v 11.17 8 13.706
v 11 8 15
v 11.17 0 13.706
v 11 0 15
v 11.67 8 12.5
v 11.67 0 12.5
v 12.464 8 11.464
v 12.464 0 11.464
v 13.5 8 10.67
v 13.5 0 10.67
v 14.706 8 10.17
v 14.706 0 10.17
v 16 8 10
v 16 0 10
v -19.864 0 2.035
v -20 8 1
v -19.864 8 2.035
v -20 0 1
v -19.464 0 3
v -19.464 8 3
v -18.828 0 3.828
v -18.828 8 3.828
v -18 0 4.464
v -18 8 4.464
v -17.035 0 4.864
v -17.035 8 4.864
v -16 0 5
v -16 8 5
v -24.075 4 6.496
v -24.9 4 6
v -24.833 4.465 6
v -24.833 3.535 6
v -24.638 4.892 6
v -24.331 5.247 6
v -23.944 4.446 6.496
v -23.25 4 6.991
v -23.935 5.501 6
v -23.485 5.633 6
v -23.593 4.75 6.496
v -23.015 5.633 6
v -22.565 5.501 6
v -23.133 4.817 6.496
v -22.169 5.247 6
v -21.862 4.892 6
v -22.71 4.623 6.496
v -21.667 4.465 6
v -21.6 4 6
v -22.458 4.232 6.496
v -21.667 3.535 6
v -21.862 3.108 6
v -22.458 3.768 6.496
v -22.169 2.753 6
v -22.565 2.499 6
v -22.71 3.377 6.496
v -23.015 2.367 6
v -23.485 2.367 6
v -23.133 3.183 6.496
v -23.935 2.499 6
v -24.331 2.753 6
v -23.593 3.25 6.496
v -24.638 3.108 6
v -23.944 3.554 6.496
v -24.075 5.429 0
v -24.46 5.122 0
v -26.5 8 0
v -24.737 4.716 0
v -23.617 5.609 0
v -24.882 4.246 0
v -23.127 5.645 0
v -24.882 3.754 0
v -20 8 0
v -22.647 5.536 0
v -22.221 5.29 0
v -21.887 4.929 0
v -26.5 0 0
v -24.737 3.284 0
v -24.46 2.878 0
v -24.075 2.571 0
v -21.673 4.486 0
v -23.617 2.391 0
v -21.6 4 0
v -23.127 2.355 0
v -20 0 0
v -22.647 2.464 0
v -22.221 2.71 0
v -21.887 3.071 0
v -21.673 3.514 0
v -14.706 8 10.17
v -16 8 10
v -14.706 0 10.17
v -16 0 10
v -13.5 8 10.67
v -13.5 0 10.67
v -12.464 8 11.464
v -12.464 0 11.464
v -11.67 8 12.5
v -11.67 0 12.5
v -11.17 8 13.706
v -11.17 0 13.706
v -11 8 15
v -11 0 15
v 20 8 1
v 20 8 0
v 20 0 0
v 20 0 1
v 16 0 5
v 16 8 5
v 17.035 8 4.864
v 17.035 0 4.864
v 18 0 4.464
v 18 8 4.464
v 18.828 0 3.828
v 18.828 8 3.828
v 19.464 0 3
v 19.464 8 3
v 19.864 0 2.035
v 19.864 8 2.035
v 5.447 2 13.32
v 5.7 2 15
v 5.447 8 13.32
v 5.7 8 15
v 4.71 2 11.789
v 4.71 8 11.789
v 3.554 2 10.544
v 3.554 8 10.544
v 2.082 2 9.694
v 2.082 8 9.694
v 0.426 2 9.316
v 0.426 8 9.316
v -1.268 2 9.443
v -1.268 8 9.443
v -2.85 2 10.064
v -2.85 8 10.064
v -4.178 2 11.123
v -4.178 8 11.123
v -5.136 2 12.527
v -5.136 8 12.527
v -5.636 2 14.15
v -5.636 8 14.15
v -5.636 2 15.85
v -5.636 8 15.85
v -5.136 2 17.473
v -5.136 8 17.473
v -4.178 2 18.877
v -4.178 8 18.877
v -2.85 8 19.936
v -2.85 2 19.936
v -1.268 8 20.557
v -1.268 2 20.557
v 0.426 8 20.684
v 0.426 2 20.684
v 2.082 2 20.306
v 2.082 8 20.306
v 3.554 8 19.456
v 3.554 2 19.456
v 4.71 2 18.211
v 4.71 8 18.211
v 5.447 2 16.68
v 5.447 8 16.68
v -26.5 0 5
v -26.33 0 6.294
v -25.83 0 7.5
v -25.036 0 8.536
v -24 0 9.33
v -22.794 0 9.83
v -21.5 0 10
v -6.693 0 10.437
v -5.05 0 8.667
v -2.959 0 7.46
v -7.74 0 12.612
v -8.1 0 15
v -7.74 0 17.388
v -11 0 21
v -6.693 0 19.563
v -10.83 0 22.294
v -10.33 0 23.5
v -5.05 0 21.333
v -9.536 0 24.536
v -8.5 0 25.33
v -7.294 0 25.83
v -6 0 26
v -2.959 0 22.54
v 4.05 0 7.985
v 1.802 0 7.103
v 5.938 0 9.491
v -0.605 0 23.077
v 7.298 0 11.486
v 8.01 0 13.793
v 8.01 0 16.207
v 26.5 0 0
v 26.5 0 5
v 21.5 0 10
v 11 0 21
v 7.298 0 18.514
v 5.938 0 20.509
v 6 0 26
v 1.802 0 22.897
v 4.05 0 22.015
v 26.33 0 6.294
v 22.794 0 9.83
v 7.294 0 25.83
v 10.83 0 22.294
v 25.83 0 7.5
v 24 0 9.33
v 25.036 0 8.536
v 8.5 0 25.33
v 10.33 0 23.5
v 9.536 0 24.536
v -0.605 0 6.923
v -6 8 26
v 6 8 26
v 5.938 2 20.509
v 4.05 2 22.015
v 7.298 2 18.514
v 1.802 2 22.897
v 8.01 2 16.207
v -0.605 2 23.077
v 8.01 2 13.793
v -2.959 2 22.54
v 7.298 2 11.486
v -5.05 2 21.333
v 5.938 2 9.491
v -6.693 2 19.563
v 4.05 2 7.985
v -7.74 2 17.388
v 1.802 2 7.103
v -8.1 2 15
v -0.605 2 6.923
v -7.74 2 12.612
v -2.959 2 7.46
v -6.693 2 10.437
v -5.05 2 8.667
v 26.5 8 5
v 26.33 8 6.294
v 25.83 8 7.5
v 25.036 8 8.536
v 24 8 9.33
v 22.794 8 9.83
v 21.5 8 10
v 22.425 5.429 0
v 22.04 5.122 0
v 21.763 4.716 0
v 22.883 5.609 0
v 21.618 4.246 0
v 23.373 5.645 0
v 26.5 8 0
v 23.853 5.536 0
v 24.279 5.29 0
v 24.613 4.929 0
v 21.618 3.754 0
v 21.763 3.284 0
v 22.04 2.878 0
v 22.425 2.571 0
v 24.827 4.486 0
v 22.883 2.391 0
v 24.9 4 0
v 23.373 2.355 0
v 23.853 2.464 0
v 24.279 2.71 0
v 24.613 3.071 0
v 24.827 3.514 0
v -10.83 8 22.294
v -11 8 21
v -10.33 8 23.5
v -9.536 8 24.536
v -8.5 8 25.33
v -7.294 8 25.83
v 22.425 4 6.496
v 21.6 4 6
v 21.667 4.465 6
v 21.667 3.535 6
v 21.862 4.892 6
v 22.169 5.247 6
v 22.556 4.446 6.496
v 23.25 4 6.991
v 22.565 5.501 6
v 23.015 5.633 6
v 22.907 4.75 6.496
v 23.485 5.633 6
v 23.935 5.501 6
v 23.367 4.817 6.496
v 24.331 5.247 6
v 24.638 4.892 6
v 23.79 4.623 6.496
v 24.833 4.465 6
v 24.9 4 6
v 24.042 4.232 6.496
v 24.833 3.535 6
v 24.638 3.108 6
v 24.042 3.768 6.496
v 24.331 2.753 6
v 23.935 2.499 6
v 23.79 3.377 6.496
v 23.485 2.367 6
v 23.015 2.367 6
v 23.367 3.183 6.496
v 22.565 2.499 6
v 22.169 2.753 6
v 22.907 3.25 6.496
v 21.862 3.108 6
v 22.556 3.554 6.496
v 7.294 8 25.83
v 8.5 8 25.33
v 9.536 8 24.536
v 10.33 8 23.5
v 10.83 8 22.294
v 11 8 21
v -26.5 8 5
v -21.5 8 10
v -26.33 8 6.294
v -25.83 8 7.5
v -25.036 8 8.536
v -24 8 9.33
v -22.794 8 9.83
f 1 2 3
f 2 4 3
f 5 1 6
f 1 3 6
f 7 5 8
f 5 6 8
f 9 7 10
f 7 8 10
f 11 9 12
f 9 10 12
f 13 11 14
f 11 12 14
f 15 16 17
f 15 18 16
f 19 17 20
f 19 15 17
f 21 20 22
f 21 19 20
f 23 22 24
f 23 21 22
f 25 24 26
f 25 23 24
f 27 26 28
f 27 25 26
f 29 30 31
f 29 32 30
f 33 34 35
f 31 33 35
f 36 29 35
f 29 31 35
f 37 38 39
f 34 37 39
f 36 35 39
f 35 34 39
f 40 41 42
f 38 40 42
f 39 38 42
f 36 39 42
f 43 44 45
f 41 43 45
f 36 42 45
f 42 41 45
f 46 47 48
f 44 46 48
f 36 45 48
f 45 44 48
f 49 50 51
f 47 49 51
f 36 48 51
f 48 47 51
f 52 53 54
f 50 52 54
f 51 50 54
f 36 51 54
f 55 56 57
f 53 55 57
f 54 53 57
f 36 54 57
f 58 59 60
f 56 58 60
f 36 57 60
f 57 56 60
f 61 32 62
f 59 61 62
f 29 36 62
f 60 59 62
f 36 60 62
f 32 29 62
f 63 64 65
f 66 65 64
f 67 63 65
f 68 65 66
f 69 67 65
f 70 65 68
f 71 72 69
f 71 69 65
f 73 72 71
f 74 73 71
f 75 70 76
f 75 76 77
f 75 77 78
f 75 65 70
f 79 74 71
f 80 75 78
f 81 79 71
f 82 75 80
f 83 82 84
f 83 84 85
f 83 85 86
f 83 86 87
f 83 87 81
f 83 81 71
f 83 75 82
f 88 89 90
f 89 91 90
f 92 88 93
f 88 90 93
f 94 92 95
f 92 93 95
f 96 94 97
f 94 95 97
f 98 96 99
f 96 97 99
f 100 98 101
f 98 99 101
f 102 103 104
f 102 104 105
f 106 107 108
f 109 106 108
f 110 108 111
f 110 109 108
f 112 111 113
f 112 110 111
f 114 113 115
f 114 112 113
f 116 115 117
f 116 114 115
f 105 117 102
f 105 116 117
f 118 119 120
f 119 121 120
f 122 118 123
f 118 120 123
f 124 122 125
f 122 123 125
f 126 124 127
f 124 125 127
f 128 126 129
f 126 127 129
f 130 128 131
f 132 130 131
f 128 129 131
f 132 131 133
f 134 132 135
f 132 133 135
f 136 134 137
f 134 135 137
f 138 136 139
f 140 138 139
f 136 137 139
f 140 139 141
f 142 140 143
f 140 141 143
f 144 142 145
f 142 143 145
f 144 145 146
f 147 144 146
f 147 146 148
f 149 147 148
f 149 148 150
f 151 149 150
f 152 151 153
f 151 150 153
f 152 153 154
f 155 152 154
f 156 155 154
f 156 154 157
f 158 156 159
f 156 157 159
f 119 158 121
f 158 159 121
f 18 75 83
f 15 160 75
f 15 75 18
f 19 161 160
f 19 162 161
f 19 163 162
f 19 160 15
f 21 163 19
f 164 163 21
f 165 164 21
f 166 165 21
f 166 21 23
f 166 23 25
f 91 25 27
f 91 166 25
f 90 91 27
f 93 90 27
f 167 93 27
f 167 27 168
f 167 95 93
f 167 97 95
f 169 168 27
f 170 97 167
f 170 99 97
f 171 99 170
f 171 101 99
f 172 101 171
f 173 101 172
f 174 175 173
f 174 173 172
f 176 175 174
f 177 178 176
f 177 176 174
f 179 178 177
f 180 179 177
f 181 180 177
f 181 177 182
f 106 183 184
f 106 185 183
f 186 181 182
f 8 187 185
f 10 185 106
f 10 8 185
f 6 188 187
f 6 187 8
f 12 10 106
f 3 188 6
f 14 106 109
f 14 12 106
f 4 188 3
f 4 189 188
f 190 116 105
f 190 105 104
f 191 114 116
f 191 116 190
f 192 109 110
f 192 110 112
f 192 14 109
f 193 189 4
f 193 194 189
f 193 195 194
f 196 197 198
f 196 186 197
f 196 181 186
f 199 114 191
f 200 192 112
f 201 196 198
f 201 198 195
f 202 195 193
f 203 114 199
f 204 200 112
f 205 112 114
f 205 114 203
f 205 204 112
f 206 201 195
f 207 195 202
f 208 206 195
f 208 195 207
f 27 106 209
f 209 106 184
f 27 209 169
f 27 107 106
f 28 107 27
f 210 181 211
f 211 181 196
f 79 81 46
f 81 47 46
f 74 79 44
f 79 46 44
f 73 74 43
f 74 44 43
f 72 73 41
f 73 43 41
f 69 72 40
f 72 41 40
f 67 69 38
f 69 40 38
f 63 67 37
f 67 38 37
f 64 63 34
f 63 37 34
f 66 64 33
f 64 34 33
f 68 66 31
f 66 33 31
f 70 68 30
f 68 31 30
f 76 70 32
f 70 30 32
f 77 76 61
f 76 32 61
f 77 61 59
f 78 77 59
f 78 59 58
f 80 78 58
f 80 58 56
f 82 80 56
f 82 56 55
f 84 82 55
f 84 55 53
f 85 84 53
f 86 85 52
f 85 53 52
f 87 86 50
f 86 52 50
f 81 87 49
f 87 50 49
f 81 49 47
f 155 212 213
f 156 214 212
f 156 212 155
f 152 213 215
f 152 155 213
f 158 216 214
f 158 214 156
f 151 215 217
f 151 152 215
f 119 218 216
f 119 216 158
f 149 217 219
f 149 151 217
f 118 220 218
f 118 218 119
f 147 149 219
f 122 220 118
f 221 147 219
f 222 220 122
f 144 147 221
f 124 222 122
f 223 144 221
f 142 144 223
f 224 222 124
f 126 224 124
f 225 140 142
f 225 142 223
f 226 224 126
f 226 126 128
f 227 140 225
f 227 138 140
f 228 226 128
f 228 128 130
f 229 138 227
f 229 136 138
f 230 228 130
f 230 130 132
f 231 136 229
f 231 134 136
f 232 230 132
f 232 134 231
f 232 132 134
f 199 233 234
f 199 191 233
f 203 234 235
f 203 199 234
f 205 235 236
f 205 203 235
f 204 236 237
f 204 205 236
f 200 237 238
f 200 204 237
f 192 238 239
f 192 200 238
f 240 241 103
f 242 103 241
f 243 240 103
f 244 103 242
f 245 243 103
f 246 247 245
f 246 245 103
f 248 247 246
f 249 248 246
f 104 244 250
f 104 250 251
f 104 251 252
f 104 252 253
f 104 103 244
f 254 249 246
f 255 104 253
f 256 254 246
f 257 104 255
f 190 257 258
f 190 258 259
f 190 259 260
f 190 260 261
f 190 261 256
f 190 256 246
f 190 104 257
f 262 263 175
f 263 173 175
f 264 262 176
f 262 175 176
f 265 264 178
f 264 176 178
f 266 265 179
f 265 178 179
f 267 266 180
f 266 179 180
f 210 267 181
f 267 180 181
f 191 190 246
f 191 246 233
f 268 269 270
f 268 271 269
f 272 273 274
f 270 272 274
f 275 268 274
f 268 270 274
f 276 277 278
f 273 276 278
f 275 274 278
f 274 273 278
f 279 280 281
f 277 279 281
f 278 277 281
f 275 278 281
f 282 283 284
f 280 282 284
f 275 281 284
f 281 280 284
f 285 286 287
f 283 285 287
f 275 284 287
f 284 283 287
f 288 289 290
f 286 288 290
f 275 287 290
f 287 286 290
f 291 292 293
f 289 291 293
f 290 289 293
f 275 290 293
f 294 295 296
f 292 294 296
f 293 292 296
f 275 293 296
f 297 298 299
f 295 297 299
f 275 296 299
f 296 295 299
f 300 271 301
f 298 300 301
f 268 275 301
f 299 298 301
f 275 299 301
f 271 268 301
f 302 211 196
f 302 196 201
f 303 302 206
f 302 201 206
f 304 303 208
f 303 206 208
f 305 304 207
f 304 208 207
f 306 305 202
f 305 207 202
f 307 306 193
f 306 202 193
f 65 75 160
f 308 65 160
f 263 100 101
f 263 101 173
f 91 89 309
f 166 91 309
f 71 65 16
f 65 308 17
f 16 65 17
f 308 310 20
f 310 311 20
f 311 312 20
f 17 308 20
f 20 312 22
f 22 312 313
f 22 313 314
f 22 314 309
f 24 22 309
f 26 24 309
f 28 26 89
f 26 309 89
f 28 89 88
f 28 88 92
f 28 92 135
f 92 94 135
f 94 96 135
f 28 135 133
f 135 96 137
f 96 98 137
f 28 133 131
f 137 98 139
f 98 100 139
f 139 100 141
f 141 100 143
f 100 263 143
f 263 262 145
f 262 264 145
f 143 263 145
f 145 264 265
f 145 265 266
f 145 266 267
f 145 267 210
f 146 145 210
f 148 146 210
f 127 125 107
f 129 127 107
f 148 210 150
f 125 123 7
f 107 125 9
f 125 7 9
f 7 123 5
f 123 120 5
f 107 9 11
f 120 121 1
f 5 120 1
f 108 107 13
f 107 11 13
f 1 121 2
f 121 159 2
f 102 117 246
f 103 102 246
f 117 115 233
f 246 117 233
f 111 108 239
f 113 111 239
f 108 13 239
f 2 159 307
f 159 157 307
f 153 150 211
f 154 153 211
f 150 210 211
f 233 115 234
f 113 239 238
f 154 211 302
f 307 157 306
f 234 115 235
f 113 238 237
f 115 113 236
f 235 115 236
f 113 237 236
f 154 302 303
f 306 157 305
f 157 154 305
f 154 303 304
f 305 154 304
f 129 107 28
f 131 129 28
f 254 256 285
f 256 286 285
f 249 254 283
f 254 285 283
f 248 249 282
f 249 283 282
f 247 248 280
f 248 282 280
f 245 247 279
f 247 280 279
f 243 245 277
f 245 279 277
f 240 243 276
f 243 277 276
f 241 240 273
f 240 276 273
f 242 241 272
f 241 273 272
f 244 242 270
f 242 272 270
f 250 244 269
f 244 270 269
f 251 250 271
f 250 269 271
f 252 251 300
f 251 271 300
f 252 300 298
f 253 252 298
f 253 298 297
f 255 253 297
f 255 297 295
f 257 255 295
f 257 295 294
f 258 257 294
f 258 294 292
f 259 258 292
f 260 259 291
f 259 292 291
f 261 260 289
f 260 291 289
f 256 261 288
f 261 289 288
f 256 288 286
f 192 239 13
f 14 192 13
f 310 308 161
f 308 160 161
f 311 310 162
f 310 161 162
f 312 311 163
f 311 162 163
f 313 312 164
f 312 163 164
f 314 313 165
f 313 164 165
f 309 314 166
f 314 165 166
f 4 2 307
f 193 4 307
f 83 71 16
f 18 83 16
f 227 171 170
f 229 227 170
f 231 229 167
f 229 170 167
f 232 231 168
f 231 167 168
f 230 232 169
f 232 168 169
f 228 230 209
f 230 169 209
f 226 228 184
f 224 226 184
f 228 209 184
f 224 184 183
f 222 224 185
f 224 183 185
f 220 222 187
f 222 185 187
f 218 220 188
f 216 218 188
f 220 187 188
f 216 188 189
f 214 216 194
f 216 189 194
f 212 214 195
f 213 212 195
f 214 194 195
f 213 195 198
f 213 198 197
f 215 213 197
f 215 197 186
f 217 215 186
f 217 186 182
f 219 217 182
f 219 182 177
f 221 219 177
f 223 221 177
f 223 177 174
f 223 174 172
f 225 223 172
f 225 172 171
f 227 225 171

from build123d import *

# Parameters (mm, degrees)
SKETCH1_W                                = 53
SKETCH1_H                                = 26
BOSS_EXTRUDE1_DEPTH                      = 8
SKETCH2_W                                = 15.5
SKETCH2_H                                = 16
CUT_EXTRUDE1_DEPTH                       = 38.976966704
SKETCH3_W                                = 15.5
SKETCH3_H                                = 16
CUT_EXTRUDE2_DEPTH                       = 38.976966704
SKETCH4_W                                = 40.000000023
SKETCH4_H                                = 5
CUT_EXTRUDE3_DEPTH                       = 38.976966704
CBORE_FOR_M10_HEX_HEAD_BOLT1_D           = 11.4
CBORE_FOR_M10_HEX_HEAD_BOLT1_CBORE_D     = 16.2
CBORE_FOR_M10_HEX_HEAD_BOLT1_CBORE_DEPTH = 2
M4X0_7_TAPPED_HOLE1_D                    = 3.3
M4X0_7_TAPPED_HOLE1_DEPTH                = 6
M4X0_7_TAPPED_HOLE1_TIP                  = 0.991420021
FILLET1_R                                = 4
FILLET2_R                                = 5


with BuildPart() as part:
    # Sketch1 → Boss-Extrude1 (new body)
    with BuildSketch(Plane.XZ):
        with Locations((0, 13)):
            Rectangle(SKETCH1_W, SKETCH1_H)
    extrude(amount=-BOSS_EXTRUDE1_DEPTH)

    # Sketch2 → Cut-Extrude1 (cut, through all)
    with BuildSketch(Plane(origin=(0, 8, 0), x_dir=(-1, 0, 0), z_dir=(0, 1, 0))):
        with Locations((-18.75, 18)):
            Rectangle(SKETCH2_W, SKETCH2_H)
    extrude(amount=-CUT_EXTRUDE1_DEPTH, mode=Mode.SUBTRACT)

    # Sketch3 → Cut-Extrude2 (cut, through all)
    with BuildSketch(Plane(origin=(0, 8, 0), x_dir=(-1, 0, 0), z_dir=(0, 1, 0))):
        with Locations((18.75, 18)):
            Rectangle(SKETCH3_W, SKETCH3_H)
    extrude(amount=-CUT_EXTRUDE2_DEPTH, mode=Mode.SUBTRACT)

    # Sketch4 → Cut-Extrude3 (cut, through all)
    with BuildSketch(Plane(origin=(0, 8, 0), x_dir=(-1, 0, 0), z_dir=(0, 1, 0))):
        with Locations((1.2e-08, 2.5)):
            Rectangle(SKETCH4_W, SKETCH4_H)
    extrude(amount=-CUT_EXTRUDE3_DEPTH, mode=Mode.SUBTRACT)

    # CBORE for M10 Hex Head Bolt1 (through all)
    with Locations(Plane(origin=(0, 0, 0), x_dir=(-1, 0, 0), z_dir=(0, -1, 0))):
        with Locations((0, -15)):
            CounterBoreHole(CBORE_FOR_M10_HEX_HEAD_BOLT1_D / 2, CBORE_FOR_M10_HEX_HEAD_BOLT1_CBORE_D / 2, CBORE_FOR_M10_HEX_HEAD_BOLT1_CBORE_DEPTH)

    # M4x0.7 Tapped Hole1
    with Locations(Plane(origin=(0, 0, 0), x_dir=(-1, 0, 0), z_dir=(0, 0, -1))):
        with Locations((-23.25, 4), (23.25, 4)):
            Hole(M4X0_7_TAPPED_HOLE1_D / 2, depth=M4X0_7_TAPPED_HOLE1_DEPTH)
            with Locations((0, 0, -(M4X0_7_TAPPED_HOLE1_DEPTH + M4X0_7_TAPPED_HOLE1_TIP / 2))):  # 118° drill point
                Cone(0, M4X0_7_TAPPED_HOLE1_D / 2, M4X0_7_TAPPED_HOLE1_TIP, mode=Mode.SUBTRACT)

    # Fillet1
    fillet1_edges = [part.edges().sort_by_distance(p)[0] for p in [
        (20, 4, 5),
        (-20.000000023, 4, 5),
    ]]
    fillet(fillet1_edges, radius=FILLET1_R)

    # Fillet2
    fillet2_edges = [part.edges().sort_by_distance(p)[0] for p in [
        (11, 4, 10),
        (26.5, 4, 10),
        (11, 4, 26),
        (-11, 4, 26),
        (-26.5, 4, 10),
        (-11, 4, 10),
    ]]
    fillet(fillet2_edges, radius=FILLET2_R)


solid = part.part
